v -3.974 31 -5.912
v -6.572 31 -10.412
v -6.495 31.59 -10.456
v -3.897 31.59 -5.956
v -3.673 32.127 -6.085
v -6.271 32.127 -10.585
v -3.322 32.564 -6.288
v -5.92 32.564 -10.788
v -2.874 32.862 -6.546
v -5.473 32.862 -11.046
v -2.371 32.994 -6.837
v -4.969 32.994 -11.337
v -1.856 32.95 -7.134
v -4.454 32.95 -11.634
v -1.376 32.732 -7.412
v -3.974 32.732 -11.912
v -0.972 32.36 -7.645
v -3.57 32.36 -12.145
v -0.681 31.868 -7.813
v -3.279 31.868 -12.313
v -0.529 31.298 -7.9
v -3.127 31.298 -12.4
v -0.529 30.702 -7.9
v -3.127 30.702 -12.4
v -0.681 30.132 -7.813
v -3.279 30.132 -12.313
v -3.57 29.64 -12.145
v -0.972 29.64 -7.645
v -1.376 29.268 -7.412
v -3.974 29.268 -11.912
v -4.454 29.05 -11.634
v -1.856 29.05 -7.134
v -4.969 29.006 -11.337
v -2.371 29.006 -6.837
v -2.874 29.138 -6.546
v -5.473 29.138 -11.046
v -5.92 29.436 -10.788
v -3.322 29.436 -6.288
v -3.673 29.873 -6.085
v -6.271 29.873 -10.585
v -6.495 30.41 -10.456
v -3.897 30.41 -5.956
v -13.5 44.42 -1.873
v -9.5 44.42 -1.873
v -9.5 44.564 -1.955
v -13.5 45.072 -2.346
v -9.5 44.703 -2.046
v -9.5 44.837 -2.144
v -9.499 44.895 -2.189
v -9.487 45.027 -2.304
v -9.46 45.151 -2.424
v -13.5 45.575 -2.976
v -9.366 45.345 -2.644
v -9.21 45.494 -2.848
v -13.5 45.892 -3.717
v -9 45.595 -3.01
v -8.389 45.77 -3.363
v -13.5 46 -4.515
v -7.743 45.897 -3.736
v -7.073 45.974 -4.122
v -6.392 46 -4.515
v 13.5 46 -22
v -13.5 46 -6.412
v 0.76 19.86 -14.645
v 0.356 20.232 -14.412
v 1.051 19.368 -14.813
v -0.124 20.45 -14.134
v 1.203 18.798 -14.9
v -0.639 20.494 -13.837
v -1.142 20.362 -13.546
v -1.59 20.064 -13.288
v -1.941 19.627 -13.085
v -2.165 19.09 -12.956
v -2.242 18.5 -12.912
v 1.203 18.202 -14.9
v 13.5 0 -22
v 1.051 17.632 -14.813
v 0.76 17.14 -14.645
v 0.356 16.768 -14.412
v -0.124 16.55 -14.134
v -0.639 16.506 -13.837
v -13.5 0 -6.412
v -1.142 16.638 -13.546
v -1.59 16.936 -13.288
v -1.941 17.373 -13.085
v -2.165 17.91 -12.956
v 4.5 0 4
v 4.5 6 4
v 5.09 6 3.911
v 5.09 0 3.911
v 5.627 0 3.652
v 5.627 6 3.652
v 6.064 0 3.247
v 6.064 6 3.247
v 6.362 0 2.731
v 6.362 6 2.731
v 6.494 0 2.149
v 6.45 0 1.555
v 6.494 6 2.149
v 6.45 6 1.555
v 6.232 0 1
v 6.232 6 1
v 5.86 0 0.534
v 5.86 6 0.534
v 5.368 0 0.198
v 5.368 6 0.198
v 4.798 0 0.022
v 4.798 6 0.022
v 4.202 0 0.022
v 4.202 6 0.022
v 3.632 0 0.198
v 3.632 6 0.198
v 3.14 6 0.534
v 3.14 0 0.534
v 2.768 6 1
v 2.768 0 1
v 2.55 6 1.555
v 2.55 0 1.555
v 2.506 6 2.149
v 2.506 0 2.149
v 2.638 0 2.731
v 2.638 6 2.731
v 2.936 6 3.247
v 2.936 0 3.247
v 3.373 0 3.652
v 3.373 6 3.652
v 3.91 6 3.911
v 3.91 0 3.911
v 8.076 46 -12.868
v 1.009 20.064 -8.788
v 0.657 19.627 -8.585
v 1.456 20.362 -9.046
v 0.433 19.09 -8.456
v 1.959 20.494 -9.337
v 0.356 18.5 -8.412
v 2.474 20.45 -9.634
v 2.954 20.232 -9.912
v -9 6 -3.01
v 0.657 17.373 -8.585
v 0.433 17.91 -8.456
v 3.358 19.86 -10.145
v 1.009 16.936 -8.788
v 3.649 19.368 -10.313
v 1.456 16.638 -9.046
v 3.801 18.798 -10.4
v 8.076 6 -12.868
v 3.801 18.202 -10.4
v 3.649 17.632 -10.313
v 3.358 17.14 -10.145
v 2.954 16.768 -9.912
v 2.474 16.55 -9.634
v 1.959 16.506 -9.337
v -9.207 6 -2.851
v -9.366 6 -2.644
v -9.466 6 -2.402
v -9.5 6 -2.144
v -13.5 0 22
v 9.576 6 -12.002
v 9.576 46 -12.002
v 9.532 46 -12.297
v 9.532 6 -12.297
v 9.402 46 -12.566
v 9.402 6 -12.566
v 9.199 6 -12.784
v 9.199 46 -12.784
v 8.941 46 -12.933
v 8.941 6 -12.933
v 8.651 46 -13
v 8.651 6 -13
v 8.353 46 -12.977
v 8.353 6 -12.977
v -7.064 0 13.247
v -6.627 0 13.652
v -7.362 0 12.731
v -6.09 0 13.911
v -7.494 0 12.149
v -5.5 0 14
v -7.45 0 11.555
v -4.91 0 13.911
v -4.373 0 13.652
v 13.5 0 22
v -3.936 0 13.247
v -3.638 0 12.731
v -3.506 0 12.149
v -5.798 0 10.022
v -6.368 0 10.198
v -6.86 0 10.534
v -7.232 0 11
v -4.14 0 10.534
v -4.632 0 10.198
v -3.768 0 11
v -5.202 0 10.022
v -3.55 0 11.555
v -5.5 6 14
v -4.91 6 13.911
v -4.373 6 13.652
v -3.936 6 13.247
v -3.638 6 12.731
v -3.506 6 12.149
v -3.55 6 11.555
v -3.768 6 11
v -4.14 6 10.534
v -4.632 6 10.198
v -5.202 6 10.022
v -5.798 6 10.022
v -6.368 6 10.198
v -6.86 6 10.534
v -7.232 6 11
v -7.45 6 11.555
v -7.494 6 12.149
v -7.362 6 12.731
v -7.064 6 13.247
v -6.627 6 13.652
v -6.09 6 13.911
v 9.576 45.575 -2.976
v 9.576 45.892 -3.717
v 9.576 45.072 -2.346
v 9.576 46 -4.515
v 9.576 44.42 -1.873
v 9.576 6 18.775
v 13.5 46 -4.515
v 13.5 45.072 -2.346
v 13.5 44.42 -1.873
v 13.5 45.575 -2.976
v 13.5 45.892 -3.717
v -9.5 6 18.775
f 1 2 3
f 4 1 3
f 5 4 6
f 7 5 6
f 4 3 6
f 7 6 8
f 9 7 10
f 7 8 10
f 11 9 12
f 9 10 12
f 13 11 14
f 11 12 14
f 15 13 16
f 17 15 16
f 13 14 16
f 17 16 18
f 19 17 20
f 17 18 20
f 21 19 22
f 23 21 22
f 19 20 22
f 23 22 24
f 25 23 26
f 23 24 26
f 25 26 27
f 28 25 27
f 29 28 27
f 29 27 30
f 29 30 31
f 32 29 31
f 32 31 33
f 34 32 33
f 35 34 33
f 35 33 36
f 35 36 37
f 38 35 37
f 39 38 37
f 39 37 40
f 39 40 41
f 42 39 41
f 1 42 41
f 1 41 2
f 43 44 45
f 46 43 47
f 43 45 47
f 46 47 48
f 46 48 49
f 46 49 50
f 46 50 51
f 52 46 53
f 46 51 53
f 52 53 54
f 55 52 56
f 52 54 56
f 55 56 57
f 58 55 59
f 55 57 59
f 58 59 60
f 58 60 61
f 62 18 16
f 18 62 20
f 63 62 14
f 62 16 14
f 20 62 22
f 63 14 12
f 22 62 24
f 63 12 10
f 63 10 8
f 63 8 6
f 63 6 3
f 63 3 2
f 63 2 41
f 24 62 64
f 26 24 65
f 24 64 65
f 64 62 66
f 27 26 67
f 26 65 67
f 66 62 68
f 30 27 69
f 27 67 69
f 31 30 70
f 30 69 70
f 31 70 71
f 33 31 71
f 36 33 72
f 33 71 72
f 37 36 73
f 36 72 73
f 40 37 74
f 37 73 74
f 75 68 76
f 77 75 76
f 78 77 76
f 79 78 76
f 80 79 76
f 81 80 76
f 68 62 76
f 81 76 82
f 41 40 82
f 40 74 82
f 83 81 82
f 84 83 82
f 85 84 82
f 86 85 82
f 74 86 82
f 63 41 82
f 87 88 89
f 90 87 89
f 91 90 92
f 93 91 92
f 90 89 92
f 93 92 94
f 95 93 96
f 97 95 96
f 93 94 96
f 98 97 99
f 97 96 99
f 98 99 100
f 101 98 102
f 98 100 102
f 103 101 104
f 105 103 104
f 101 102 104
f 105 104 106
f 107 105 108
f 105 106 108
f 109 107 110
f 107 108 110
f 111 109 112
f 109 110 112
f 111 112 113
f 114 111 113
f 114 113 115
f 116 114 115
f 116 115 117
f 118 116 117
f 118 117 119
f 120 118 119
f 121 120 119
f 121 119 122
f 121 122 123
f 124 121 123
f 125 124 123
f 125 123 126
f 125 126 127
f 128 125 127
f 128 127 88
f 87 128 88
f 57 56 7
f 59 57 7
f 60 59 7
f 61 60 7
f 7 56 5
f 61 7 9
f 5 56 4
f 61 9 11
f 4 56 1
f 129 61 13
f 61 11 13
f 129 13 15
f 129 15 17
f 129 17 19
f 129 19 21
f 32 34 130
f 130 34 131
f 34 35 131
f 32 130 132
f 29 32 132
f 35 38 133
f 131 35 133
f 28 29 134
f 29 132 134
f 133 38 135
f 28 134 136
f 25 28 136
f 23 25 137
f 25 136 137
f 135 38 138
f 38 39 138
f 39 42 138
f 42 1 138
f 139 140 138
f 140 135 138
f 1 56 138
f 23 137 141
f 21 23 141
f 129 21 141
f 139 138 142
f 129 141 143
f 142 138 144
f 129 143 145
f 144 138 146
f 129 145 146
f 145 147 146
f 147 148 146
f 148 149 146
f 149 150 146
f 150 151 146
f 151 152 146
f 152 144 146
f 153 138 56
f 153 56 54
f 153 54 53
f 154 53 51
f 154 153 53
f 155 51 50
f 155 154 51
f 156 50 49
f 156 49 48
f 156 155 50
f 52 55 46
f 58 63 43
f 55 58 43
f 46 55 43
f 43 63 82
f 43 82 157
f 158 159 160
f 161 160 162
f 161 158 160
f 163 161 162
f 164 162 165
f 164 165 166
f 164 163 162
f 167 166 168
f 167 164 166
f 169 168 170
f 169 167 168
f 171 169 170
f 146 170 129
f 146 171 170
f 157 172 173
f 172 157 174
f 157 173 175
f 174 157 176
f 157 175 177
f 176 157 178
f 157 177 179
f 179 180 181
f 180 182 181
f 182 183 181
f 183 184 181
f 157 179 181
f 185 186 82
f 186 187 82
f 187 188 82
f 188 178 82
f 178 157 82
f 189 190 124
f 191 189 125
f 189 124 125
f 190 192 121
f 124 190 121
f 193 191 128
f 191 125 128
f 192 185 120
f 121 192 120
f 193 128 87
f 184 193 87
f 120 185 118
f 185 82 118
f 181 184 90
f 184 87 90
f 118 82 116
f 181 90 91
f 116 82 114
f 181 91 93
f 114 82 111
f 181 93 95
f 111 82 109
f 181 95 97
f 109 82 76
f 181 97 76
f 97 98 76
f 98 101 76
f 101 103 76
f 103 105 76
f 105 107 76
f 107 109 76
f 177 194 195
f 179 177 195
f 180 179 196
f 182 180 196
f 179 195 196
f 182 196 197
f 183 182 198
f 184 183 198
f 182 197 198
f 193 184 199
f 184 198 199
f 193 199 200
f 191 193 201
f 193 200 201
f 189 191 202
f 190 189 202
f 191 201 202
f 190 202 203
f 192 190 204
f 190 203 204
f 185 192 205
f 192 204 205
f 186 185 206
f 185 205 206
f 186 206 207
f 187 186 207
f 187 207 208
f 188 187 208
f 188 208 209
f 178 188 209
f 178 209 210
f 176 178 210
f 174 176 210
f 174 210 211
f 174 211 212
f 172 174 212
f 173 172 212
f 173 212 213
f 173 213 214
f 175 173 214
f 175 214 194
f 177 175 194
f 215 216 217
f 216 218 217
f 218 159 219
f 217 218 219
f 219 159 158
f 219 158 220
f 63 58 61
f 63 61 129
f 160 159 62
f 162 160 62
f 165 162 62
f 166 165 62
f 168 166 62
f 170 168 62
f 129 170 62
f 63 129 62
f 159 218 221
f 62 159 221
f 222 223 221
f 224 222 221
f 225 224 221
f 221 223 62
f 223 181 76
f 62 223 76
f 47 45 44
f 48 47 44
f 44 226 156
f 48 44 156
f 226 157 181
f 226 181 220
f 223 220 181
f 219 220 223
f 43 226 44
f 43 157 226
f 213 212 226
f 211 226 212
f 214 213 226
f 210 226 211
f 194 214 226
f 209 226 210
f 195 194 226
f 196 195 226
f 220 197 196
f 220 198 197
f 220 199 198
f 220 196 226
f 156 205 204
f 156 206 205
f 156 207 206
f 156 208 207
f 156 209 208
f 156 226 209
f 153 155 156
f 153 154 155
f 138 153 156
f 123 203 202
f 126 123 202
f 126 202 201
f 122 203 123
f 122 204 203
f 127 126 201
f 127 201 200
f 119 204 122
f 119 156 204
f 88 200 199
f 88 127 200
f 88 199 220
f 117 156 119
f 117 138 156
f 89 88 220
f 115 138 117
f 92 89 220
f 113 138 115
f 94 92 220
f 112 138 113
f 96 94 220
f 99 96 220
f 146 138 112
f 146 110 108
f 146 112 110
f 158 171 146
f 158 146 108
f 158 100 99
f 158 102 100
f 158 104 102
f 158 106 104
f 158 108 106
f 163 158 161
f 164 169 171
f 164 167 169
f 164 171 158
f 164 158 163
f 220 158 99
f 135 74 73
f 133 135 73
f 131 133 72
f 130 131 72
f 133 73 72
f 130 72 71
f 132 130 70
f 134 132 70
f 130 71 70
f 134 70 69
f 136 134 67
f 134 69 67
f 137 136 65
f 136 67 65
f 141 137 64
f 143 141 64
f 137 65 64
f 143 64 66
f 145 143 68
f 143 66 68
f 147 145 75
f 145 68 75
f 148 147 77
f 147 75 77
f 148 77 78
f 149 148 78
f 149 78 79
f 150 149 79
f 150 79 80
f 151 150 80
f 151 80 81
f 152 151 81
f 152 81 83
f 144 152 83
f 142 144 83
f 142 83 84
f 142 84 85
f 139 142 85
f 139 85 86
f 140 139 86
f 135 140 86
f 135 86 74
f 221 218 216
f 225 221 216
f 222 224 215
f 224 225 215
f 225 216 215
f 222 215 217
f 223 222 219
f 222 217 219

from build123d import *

# Parameters (mm, degrees)
SKETCH1_W           = 27
SKETCH1_H           = 44
BOSS_EXTRUDE1_DEPTH = 6
CUT_EXTRUDE1_DEPTH  = 27.5
BOSS_EXTRUDE2_DEPTH = 40
BOSS_EXTRUDE3_DEPTH = 40
BOSS_EXTRUDE5_DEPTH = 40
SKETCH6_R           = 2
CUT_EXTRUDE2_DEPTH  = 10
CUT_EXTRUDE3_DEPTH  = 58.697486947
FILLET1_R           = 1
SKETCH5_R           = 2
CUT_EXTRUDE4_DEPTH  = 48.605146781
FILLET2_R           = 3


with BuildPart() as part:
    # Sketch1 → Boss-Extrude1 (new body)
    with BuildSketch(Plane(origin=(0, 0, 0), x_dir=(1, 0, 0), z_dir=(0, 1, 0))):
        Rectangle(SKETCH1_W, SKETCH1_H)
    extrude(amount=BOSS_EXTRUDE1_DEPTH)

    # Sketch2 → Cut-Extrude1 (cut, through all)
    with BuildSketch(Plane(origin=(0, 6, 0), x_dir=(1, 0, 0), z_dir=(0, 1, 0))):
        Polygon((13.5, 22), (-13.5, 6.411542732), (-13.5, 22), align=None)
    extrude(amount=-CUT_EXTRUDE1_DEPTH, mode=Mode.SUBTRACT)

    # Sketch4 → Boss-Extrude2 (add)
    with BuildSketch(Plane(origin=(0, 6, 0), x_dir=(1, 0, 0), z_dir=(0, 1, 0))):
        Polygon((-13.5, 6.411542732), (-13.5, 0.411542732), (13.5, 16), (13.5, 22), align=None)
    extrude(amount=BOSS_EXTRUDE2_DEPTH)

    # Sketch18 → Boss-Extrude3 (add)
    with BuildSketch(Plane(origin=(0, 6, 0), x_dir=(1, 0, 0), z_dir=(0, 1, 0))):
        Polygon((-13.5, -22), (-9.5, -22), (-9.5, 2.720943809), (-13.5, 0.411542732), align=None)
    extrude(amount=BOSS_EXTRUDE3_DEPTH)

    # Sketch19 → Boss-Extrude5 (add)
    with BuildSketch(Plane(origin=(0, 6, 0), x_dir=(1, 0, 0), z_dir=(0, 1, 0))):
        Polygon((13.5, 16), (9.575964778, 13.734457208), (9.575964778, -22), (13.5, -22), align=None)
    extrude(amount=BOSS_EXTRUDE5_DEPTH)

    # Sketch6 → Cut-Extrude2 (cut)
    with BuildSketch(Plane(origin=(-6.151279442, 0, -10.654328524), x_dir=(-0.8660254037844417, 0, 0.4999999999999949), z_dir=(-0.4999999999999949, 0, -0.8660254037844417))):
        with Locations((-6.514428415, 18.5)):
            Circle(SKETCH6_R)
        with Locations((-1.514428415, 31)):
            Circle(SKETCH6_R)
    extrude(amount=-CUT_EXTRUDE2_DEPTH, mode=Mode.SUBTRACT)

    # Sketch20 → Cut-Extrude3 (cut, through all)
    with BuildSketch(Plane.ZY.offset(13.5)):
        Polygon((22, 0), (-2.721542732, 46), (22, 46), align=None)
    extrude(amount=-CUT_EXTRUDE3_DEPTH, mode=Mode.SUBTRACT)

    # Fillet1
    # the kernel refuses this fillet: 1 mm, written as the material it adds along each edge
    with BuildSketch(Plane(origin=(-9.5, 4.556624327, -2.720943809), x_dir=(0.8660254037844415, 0, -0.4999999999999951), z_dir=(0, 1, 0))) as fillet1_piece_1_section:
        with BuildLine():
            CenterArc((FILLET1_R * 0.57735026919, -FILLET1_R), FILLET1_R, 90, 60)
            Line((-FILLET1_R * 0.288675134595, -FILLET1_R * 0.5), (0, 0))
            Line((0, 0), (FILLET1_R * 0.57735026919, 0))
        make_face()
    fillet1_piece_1 = extrude(amount=42.885636914, mode=Mode.PRIVATE)
    fillet1_piece_1 = split(fillet1_piece_1, bisect_by=Plane(origin=(-9.391668289, 14.377701734, 14.273065917), z_dir=(0, -0.47339174882638807, -0.8808520035415109)), keep=Keep.TOP, mode=Mode.PRIVATE)
    fillet1_piece_1 = split(fillet1_piece_1, bisect_by=Plane(origin=(-9.391668289, 46, -2.658398466), z_dir=(0, -1, 0)), keep=Keep.TOP, mode=Mode.PRIVATE)
    add(fillet1_piece_1)
    with BuildSketch(Plane(origin=(9.575964778, 1.669872981, -13.734457208), x_dir=(-0.8660254037844415, 0, 0.4999999999999951), z_dir=(0, 1, 0))) as fillet1_piece_2:
        with BuildLine():
            CenterArc((FILLET1_R * 1.73205080757, FILLET1_R), FILLET1_R, 150, 120)
            Line((FILLET1_R * 0.866025403784, FILLET1_R * 1.5), (0, 0))
            Line((0, 0), (FILLET1_R * 1.73205080757, 0))
        make_face()
    extrude(amount=44.330127019)

    # Sketch5 → Cut-Extrude4 (cut, through all)
    with BuildSketch(Plane(origin=(0, 6, 0), x_dir=(1, 0, 0), z_dir=(0, 1, 0))):
        with Locations(Location((-5.5, -12, 0), (0, 0, 270))):
            Circle(SKETCH5_R)
        with Locations(Location((4.5, -2, 0), (0, 0, 270))):
            Circle(SKETCH5_R)
    extrude(amount=-CUT_EXTRUDE4_DEPTH, mode=Mode.SUBTRACT)

    # Fillet2
    # the kernel refuses this fillet: 3 mm, written as the material it takes off along each edge
    with BuildSketch(Plane(origin=(5.092167423, 46, -2.721542732), x_dir=(0, 0, -1), z_dir=(1, 0, 0))) as fillet2_piece_1:
        with BuildLine():
            CenterArc((FILLET2_R * 0.59783964736, -FILLET2_R), FILLET2_R, 90, 61.74531149)
            Line((-FILLET2_R * 0.283012356181, -FILLET2_R * 0.526608251174), (0, 0))
            Line((0, 0), (FILLET2_R * 0.59783964736, 0))
        make_face()
    extrude(amount=12.891629932, mode=Mode.SUBTRACT)
    with BuildSketch(Plane(origin=(-17.983797355, 46, -2.721542732), x_dir=(0, 0, -1), z_dir=(1, 0, 0))) as fillet2_piece_2:
        with BuildLine():
            CenterArc((FILLET2_R * 0.59783964736, -FILLET2_R), FILLET2_R, 90, 61.74531149)
            Line((-FILLET2_R * 0.283012356181, -FILLET2_R * 0.526608251174), (0, 0))
            Line((0, 0), (FILLET2_R * 0.59783964736, 0))
        make_face()
    extrude(amount=8.484834721, mode=Mode.SUBTRACT)
    with BuildSketch(Plane(origin=(-4.832275393, 46, -2.721542732), x_dir=(0, 0, -1), z_dir=(-1, 0, 0))) as fillet2_piece_3:
        with BuildLine():
            CenterArc((FILLET2_R * 0.59783964736, FILLET2_R), FILLET2_R, 208.25468851, 61.74531149)
            Line((-FILLET2_R * 0.283012356181, FILLET2_R * 0.526608251174), (0, 0))
            Line((0, 0), (FILLET2_R * 0.59783964736, 0))
        make_face()
    extrude(amount=4.666687241, mode=Mode.SUBTRACT)


solid = part.part
